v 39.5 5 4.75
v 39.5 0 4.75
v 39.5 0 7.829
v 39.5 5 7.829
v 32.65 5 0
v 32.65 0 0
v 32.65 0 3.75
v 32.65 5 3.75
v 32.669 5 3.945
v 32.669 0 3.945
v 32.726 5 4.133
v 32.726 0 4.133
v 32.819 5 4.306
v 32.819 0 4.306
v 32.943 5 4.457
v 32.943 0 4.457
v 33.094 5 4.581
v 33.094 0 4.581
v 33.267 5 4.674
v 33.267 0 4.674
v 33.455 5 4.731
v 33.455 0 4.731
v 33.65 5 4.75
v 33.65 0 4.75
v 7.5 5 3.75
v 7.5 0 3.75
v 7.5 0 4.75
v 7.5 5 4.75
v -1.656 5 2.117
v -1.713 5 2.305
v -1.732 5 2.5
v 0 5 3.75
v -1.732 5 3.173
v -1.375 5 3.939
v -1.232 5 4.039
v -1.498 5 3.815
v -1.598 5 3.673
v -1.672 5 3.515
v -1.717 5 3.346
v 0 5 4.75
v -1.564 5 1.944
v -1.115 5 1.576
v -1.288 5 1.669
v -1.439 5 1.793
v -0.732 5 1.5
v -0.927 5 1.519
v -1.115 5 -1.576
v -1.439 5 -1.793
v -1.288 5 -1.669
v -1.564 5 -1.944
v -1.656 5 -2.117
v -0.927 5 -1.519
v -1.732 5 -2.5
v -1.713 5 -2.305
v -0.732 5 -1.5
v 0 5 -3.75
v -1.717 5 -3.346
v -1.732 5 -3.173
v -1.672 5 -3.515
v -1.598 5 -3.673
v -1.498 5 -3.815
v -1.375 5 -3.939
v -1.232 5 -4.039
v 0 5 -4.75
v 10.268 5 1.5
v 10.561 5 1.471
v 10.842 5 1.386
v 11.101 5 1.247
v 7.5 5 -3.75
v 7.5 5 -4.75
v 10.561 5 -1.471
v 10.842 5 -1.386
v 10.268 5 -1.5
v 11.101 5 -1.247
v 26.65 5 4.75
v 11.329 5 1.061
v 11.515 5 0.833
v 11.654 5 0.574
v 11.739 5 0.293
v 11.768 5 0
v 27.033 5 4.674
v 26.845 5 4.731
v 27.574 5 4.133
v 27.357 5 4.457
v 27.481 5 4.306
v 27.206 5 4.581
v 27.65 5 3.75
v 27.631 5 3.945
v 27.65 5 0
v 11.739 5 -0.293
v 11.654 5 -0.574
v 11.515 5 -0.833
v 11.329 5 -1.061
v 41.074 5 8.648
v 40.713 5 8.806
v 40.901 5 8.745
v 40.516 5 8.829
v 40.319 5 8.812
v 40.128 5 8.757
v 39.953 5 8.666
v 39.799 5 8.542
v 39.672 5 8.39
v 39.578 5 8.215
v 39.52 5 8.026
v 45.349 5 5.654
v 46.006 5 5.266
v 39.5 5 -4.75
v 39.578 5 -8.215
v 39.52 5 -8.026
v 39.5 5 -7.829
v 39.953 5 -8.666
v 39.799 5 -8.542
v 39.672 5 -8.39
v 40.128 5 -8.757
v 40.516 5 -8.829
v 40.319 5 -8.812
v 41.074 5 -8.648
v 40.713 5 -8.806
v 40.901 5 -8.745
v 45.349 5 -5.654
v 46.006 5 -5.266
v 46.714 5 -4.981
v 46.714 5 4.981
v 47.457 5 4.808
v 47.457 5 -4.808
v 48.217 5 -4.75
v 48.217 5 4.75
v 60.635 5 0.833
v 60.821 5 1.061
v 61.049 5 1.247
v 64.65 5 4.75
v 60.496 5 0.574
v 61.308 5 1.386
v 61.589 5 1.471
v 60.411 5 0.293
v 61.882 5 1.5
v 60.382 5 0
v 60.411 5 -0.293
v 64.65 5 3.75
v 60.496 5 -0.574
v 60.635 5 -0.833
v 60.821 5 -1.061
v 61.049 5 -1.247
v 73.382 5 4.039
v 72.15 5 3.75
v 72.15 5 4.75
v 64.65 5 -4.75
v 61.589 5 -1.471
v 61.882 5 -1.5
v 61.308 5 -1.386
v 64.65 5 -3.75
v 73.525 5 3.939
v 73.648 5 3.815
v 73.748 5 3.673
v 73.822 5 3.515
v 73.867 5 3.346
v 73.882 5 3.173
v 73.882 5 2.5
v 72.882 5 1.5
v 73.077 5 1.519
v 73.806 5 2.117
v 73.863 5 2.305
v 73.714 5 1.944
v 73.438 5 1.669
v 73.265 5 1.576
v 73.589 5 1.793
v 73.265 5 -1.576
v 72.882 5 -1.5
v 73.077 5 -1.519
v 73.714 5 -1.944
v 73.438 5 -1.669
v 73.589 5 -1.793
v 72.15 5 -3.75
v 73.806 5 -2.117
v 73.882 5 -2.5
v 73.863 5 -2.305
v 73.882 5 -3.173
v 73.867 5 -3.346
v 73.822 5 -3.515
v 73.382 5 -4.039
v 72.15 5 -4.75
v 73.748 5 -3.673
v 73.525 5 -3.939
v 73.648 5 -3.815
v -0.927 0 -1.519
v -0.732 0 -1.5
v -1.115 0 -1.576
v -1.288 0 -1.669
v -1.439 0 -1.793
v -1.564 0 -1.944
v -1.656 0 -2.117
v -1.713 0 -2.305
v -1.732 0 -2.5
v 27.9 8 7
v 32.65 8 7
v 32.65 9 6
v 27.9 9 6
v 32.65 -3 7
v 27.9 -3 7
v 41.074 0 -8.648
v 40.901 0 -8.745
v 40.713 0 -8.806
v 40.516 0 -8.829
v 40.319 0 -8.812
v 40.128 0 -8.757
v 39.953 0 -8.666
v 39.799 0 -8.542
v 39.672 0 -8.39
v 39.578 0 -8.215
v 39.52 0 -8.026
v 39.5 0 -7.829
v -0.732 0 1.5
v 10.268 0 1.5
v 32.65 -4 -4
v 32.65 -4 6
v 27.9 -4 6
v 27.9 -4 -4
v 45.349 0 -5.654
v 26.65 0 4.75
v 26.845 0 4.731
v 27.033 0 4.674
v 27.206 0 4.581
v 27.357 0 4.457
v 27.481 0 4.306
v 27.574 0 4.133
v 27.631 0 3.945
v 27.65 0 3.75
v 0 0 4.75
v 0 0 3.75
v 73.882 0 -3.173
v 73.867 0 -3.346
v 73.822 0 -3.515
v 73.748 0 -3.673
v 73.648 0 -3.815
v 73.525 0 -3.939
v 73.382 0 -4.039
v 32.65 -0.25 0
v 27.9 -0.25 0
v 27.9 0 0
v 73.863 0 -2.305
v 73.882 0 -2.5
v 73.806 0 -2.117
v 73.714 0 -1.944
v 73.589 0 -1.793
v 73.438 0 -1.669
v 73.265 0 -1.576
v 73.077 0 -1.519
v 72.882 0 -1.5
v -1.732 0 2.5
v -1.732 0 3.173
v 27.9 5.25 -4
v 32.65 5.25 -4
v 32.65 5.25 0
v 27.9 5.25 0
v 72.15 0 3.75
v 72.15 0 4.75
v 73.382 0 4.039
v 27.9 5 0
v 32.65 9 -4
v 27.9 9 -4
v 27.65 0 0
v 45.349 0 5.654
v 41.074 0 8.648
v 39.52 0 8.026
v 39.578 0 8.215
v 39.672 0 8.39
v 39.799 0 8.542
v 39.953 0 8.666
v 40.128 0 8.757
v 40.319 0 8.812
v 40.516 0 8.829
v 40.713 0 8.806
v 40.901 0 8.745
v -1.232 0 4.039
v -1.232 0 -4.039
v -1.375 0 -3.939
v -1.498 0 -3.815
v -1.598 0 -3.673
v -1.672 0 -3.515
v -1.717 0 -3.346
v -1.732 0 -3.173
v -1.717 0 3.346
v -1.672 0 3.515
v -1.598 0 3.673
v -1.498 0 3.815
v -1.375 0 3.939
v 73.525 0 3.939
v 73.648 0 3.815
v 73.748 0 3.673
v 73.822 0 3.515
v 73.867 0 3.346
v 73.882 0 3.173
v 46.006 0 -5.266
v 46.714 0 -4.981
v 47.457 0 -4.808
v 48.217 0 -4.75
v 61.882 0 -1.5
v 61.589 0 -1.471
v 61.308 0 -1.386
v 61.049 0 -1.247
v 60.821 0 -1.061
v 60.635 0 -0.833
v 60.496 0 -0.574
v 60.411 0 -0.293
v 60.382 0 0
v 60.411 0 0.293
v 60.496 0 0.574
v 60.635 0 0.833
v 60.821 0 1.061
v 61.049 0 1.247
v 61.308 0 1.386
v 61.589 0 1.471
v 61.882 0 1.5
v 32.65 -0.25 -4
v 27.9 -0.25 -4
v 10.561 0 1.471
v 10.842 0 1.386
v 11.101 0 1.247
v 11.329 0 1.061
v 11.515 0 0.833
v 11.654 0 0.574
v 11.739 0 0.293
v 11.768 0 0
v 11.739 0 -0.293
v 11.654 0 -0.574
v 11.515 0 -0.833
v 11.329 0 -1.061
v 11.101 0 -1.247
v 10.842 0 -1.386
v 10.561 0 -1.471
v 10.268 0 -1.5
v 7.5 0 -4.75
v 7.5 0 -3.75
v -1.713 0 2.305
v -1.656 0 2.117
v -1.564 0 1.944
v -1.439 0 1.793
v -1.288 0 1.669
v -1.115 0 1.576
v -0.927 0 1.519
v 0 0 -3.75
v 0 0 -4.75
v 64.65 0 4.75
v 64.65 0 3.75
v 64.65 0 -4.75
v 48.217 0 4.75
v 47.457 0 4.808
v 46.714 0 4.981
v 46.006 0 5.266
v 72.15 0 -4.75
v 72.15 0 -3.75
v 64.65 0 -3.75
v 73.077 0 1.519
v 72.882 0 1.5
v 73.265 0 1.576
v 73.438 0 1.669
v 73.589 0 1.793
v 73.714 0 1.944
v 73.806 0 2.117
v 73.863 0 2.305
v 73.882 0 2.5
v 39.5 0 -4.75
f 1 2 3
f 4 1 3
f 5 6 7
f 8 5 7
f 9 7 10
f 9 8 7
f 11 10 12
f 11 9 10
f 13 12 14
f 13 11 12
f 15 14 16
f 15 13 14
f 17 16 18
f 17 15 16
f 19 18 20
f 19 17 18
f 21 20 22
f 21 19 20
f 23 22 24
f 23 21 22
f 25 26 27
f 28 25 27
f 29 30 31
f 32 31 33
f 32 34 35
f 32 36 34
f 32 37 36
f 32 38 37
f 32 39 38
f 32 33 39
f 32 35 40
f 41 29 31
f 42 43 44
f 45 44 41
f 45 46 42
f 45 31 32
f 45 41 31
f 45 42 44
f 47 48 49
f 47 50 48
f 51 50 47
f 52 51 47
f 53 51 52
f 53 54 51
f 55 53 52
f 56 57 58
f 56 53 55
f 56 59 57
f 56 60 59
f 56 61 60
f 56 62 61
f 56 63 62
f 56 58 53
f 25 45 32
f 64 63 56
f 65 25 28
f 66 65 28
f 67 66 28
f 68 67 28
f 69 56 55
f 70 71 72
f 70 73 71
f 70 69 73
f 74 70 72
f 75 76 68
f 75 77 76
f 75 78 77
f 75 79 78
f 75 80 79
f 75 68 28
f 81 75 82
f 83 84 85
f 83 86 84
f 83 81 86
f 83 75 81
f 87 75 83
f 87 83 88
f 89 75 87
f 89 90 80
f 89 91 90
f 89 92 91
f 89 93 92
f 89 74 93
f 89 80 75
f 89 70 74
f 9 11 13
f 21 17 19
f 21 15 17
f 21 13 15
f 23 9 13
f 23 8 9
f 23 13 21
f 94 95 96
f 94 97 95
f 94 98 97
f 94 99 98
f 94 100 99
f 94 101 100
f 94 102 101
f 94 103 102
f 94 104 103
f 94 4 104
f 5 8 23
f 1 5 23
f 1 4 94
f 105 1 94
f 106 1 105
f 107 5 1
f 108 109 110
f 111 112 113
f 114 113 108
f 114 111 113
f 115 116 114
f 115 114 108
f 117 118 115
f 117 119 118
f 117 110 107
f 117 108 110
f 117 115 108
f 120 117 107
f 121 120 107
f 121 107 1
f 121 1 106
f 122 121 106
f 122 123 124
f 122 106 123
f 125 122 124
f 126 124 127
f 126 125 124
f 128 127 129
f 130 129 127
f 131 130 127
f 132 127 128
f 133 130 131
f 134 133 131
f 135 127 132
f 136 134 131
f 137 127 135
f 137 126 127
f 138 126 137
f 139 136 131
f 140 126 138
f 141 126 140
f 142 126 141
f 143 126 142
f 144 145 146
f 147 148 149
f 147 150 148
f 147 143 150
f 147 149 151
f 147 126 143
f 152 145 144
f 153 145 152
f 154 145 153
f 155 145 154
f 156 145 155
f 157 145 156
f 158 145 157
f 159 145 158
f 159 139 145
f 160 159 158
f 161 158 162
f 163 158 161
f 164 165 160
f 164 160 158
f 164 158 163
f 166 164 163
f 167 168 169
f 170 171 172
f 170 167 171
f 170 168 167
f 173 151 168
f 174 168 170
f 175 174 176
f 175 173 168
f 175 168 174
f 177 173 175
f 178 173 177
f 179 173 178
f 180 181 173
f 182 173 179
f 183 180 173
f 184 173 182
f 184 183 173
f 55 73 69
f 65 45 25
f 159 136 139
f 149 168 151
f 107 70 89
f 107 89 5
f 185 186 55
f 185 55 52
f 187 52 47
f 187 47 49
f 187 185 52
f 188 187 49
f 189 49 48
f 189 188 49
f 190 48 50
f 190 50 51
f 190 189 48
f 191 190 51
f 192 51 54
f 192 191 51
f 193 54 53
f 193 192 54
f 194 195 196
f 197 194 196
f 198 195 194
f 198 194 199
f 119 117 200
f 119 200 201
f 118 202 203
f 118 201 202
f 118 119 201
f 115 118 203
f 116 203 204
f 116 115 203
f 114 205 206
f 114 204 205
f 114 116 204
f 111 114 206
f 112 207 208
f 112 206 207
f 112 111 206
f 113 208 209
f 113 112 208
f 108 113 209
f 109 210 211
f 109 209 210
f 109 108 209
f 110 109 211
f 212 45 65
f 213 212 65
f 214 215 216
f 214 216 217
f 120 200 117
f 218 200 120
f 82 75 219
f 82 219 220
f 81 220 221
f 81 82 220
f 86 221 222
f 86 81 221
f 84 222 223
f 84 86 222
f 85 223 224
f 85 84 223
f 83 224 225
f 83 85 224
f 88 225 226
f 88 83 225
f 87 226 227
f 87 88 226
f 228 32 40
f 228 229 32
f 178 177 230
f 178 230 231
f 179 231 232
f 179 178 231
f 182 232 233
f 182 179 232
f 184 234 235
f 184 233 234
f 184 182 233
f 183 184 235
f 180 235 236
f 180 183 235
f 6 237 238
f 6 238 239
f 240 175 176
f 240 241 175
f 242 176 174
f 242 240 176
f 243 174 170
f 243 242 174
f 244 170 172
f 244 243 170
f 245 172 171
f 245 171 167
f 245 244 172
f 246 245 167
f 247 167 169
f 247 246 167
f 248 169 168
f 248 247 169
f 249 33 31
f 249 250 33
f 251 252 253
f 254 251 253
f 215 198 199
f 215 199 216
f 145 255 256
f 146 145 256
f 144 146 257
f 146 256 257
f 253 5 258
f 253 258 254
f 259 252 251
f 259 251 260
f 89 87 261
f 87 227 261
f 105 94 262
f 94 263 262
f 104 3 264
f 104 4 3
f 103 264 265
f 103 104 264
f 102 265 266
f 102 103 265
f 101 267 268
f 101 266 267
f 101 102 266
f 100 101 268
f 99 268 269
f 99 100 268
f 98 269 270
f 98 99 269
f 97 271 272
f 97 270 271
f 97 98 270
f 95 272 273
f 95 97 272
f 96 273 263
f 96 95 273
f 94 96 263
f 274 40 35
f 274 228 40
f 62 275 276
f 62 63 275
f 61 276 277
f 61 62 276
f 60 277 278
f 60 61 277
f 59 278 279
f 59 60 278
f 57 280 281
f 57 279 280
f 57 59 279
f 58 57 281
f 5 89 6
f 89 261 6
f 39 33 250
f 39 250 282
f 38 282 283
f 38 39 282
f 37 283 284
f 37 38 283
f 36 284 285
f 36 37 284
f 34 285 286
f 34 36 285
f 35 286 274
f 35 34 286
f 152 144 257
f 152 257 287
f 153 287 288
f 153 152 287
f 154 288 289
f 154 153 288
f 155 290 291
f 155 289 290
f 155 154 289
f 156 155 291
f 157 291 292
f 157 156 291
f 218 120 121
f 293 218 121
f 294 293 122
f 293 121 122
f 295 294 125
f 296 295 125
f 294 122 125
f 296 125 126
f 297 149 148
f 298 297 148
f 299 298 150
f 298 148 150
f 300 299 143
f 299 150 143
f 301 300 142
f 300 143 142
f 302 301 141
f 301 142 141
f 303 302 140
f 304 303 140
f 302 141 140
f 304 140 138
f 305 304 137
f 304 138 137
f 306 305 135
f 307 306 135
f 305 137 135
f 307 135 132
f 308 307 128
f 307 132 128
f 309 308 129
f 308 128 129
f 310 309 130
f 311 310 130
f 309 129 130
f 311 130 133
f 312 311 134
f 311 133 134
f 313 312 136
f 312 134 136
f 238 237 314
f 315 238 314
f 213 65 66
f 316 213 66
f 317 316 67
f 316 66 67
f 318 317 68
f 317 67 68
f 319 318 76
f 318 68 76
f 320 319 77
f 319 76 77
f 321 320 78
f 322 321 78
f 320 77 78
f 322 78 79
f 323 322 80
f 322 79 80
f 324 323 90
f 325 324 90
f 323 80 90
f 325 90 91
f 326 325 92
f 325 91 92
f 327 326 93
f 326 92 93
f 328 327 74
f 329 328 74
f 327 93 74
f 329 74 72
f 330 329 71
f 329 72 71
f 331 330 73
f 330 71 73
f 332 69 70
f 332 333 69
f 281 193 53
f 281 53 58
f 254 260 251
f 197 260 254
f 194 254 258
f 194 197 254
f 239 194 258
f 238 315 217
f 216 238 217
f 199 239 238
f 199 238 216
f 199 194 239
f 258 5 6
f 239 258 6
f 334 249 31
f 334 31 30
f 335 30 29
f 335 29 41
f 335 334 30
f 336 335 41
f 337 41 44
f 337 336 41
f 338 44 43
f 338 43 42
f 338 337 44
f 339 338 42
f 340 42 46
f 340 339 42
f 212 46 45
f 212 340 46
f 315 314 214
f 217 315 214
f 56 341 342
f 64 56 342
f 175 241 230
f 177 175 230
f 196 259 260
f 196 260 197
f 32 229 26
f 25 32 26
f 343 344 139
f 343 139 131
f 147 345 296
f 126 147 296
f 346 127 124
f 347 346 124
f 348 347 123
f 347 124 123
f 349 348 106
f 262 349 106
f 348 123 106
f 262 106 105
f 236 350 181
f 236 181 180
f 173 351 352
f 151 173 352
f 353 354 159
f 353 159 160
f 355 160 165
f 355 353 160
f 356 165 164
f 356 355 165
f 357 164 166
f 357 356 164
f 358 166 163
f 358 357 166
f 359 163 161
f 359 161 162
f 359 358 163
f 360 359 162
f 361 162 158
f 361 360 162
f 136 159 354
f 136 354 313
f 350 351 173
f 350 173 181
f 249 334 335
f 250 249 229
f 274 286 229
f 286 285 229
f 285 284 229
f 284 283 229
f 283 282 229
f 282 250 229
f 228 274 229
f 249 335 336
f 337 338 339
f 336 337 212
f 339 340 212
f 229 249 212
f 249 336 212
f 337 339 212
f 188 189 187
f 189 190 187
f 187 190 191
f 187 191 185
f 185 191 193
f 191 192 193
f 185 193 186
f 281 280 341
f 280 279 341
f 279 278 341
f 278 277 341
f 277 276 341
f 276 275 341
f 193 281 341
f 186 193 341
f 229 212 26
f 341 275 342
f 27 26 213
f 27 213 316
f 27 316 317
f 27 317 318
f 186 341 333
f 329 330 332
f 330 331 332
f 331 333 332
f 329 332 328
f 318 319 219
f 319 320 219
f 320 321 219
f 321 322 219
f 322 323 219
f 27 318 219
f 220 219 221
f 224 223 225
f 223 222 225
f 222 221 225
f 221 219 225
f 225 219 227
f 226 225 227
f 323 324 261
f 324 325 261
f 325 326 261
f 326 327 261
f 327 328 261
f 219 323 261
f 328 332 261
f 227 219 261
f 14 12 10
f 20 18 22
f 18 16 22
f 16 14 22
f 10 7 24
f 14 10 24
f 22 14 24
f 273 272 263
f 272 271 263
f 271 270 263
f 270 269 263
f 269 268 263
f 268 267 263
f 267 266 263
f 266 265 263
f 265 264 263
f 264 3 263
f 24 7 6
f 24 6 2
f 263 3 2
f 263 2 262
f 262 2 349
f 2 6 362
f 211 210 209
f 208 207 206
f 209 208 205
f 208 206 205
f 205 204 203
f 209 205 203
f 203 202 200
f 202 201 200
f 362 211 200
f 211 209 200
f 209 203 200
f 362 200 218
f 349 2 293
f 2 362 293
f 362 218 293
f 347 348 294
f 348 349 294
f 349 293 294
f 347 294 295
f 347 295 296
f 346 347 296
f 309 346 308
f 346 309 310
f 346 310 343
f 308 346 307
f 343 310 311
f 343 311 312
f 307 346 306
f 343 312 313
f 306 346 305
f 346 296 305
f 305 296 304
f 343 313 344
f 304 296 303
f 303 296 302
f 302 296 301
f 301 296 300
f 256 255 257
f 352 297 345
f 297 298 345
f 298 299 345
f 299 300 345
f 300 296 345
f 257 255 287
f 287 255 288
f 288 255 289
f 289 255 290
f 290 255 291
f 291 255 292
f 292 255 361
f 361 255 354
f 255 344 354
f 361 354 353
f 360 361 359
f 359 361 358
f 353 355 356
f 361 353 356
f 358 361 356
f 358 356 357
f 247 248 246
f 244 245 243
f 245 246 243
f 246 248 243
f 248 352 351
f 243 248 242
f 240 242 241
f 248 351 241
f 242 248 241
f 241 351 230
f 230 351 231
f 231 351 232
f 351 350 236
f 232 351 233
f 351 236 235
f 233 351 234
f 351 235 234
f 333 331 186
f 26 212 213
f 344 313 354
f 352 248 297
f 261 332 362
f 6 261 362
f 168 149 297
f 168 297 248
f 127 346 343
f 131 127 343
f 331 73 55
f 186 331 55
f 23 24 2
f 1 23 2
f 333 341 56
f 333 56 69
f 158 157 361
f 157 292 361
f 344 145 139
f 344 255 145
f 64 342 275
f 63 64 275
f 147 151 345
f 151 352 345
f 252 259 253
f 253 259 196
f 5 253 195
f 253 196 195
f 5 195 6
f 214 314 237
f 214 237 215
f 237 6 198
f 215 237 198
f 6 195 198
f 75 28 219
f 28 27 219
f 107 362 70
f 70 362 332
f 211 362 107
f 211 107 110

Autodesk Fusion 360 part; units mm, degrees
sketch "Sketch1" plane through (0, 0, 0) normal (0, 1, 0) x (1, 0, 0)
  line L0 (0, 0) -> (0, -3.75) construction
  line L1 (0, -3.75) -> (7.5, -3.75)
  line L2 (0, -3.75) -> (0, -4.75)
  line L3 (0, -4.75) -> (-1.7321, -3.75)
  line L4 (0, -4.75) -> (1.5486, -4.75) construction
  line L5 (-1.7321, -3.75) -> (-1.7321, 0)
  line L6 (7.5, -3.75) -> (7.5, -4.75)
  line L7 (7.5, -4.75) -> (64.65, -4.75)
  line L8 (-1.7321, 0) -> (36.075, 0) construction
  line L9 (36.075, 0) -> (36.075, -4.75) construction
  line L10 (73.8821, -3.75) -> (73.8821, 0)
  line L11 (72.15, -4.75) -> (73.8821, -3.75)
  line L12 (72.15, -3.75) -> (64.65, -3.75)
  line L13 (72.15, -3.75) -> (72.15, -4.75)
  line L14 (64.65, -3.75) -> (64.65, -4.75)
  line L15 (64.65, -4.75) -> (7.5, -4.75)
  line L16 (73.8821, 3.75) -> (73.8821, 0)
  line L17 (72.15, 4.75) -> (73.8821, 3.75)
  line L18 (72.15, 3.75) -> (64.65, 3.75)
  line L19 (72.15, 3.75) -> (72.15, 4.75)
  line L20 (64.65, 3.75) -> (64.65, 4.75)
  line L21 (64.65, 4.75) -> (7.5, 4.75)
  line L22 (7.5, 3.75) -> (7.5, 4.75)
  line L23 (0, 3.75) -> (7.5, 3.75)
  line L24 (0, 3.75) -> (0, 4.75)
  line L25 (0, 4.75) -> (-1.7321, 3.75)
  line L26 (-1.7321, 3.75) -> (-1.7321, 0)
  line L27 (-1.7321, 0) -> (73.8821, 0)
  point P0 (36.075, -4.75)
  dimension "d1" = 3.75
  dimension "d2" = 7.5
  dimension "d4" = 150
  dimension "d5" = 57.15
  dimension "d8" = 4.75
extrude "Extrude1" add sketch "Sketch1" along normal blind 5 makes body 1
sketch "Sketch2" plane through (0, 5, 0) normal (0, 1, 0) x (-1, 0, 0)
  line L0 (0, -3.75) -> (0, -4.75)
  line L1 (0, -4.75) -> (1.7321, -3.75)
  line L2 (1.7321, -3.75) -> (1.7321, 3.75)
  line L3 (1.7321, 3.75) -> (0, 4.75)
  line L4 (0, 4.75) -> (0, 3.75)
  line L5 (0, 3.75) -> (-7.5, 3.75)
  line L6 (-7.5, 3.75) -> (-7.5, 4.75)
  line L7 (-7.5, 4.75) -> (-64.65, 4.75)
  line L8 (-64.65, 4.75) -> (-64.65, 3.75)
  line L9 (-64.65, 3.75) -> (-72.15, 3.75)
  line L10 (-72.15, 3.75) -> (-72.15, 4.75)
  line L11 (-72.15, 4.75) -> (-73.8821, 3.75)
  line L12 (-73.8821, 3.75) -> (-73.8821, -3.75)
  line L13 (-73.8821, -3.75) -> (-72.15, -4.75)
  line L14 (-72.15, -4.75) -> (-72.15, -3.75)
  line L15 (-72.15, -3.75) -> (-64.65, -3.75)
  line L16 (-64.65, -3.75) -> (-64.65, -4.75)
  line L17 (-64.65, -4.75) -> (-7.5, -4.75)
  line L18 (-7.5, -4.75) -> (-7.5, -3.75)
  line L19 (-7.5, -3.75) -> (0, -3.75)
  line L20 (-73.8821, 0) -> (1.7321, 0) construction
  line L21 (-36.075, 4.75) -> (-36.075, -4.75) construction
  line L22 (1.7321, 1.5) -> (-10.2679, 1.5)
  arc A0 (-10.2679, 1.5) -> (-10.2679, -1.5) centre (-10.2679, 0) ccw
  line L23 (-10.2679, -1.5) -> (1.7321, -1.5)
  arc A1 (1.7321, -1.5) -> (1.7321, 1.5) centre (1.7321, 0) ccw
  line L24 (1.7321, 0) -> (-10.2679, 0) construction
  line L25 (-61.8821, -1.5) -> (-73.8821, -1.5)
  arc A2 (-61.8821, -1.5) -> (-61.8821, 1.5) centre (-61.8821, 0) ccw
  line L26 (-73.8821, 1.5) -> (-61.8821, 1.5)
  arc A3 (-73.8821, 1.5) -> (-73.8821, -1.5) centre (-73.8821, 0) ccw
  dimension "d9" = 1.5
  dimension "d10" = 12
extrude "Extrude2" cut sketch "Sketch2" against normal through all contours L2 L22 A0 L23 | L12 L25 A2 L26 bodies 1
sketch "Sketch3" plane through (0, 0, 0) normal (0, -1, 0) x (1, 0, 0)
  line L0 (61.8821, 1.5) -> (73.8821, 1.5)
  line L1 (73.8821, 1.5) -> (73.8821, 3.75)
  line L2 (73.8821, 3.75) -> (72.15, 4.75)
  line L3 (72.15, 4.75) -> (72.15, 3.75)
  line L4 (72.15, 3.75) -> (64.65, 3.75)
  line L5 (64.65, 3.75) -> (64.65, 4.75)
  line L6 (64.65, 4.75) -> (7.5, 4.75)
  line L7 (7.5, 4.75) -> (7.5, 3.75)
  line L8 (7.5, 3.75) -> (0, 3.75)
  line L9 (0, 3.75) -> (0, 4.75)
  line L10 (0, 4.75) -> (-1.7321, 3.75)
  line L11 (-1.7321, 3.75) -> (-1.7321, 1.5)
  line L12 (-1.7321, 1.5) -> (10.2679, 1.5)
  arc A0 (10.2679, -1.5) -> (10.2679, 1.5) centre (10.2679, 0) ccw
  line L13 (10.2679, -1.5) -> (-1.7321, -1.5)
  line L14 (-1.7321, -1.5) -> (-1.7321, -3.75)
  line L15 (-1.7321, -3.75) -> (0, -4.75)
  line L16 (0, -4.75) -> (0, -3.75)
  line L17 (0, -3.75) -> (7.5, -3.75)
  line L18 (7.5, -3.75) -> (7.5, -4.75)
  line L19 (7.5, -4.75) -> (64.65, -4.75)
  line L20 (64.65, -4.75) -> (64.65, -3.75)
  line L21 (64.65, -3.75) -> (72.15, -3.75)
  line L22 (72.15, -3.75) -> (72.15, -4.75)
  line L23 (72.15, -4.75) -> (73.8821, -3.75)
  line L24 (73.8821, -3.75) -> (73.8821, -1.5)
  line L25 (73.8821, -1.5) -> (61.8821, -1.5)
  arc A1 (61.8821, 1.5) -> (61.8821, -1.5) centre (61.8821, 0) ccw
  line L26 (36.075, 4.75) -> (36.075, -4.75) construction
  line L27 (32.65, 4.75) -> (32.65, -4.75) construction
  line L28 (39.5, 4.75) -> (39.5, -4.75) construction
  line L29 (39.5, 4.75) -> (39.5, 9.75)
  line L30 (39.5, 9.75) -> (46.6407, 4.75)
  line L31 (32.65, 0) -> (39.5, 0) construction
  line L32 (39.5, -4.75) -> (39.5, -9.75)
  line L33 (39.5, -9.75) -> (46.6407, -4.75)
  line L34 (32.65, 4.75) -> (27.65, 4.75)
  line L35 (27.65, 4.75) -> (27.65, 0)
  line L36 (27.65, 0) -> (32.65, 0)
  line L37 (32.65, 0) -> (32.65, 4.75)
  dimension "d13" = 6.85
  dimension "d14" = 35
  dimension "d15" = 5
  dimension "d16" = 5
  dimension "d17" = 4.75
extrude "Extrude3" add sketch "Sketch3" against normal blind 5 contours L6 L29 L30 | L19 L32 L33 bodies 1
extrude "Extrude4" cut sketch "Sketch3" against normal blind 5 contours L6 L34 L35 L36 L37 bodies 1
fillet "Fillet1" radius 1 2 edges at (39.5, 2.5, 9.75) (39.5, 2.5, -9.75) on bodies 1
fillet "Fillet1" radius 5 2 edges at (46.6407, 2.5, 4.75) (46.6407, 2.5, -4.75) on bodies 1
fillet "Fillet1" radius 1 8 edges at (73.8821, 2.5, 3.75) (73.8821, 2.5, 1.5) (73.8821, 2.5, -1.5) (73.8821, 2.5, -3.75) (-1.7321, 2.5, 3.75) (-1.7321, 2.5, 1.5) (-1.7321, 2.5, -1.5) (-1.7321, 2.5, -3.75) on bodies 1
fillet "Fillet1" radius 1 2 edges at (32.65, 2.5, 4.75) (27.65, 2.5, 4.75) on bodies 1
sketch "Sketch1 (2)" plane through (32.65, 0, 0) normal (-1, 0, 0) x (0, -1, 0) in component "Component"
  line L0 (-5, 3.75) -> (-5, 0)
  line L1 (-5, 0) -> (0, 0)
  line L2 (0, 0) -> (0, 3.75)
  line L3 (0, 0) -> (-5, 0)
  line L4 (-5, 0) -> (0, 0)
  line L5 (0.25, 0) -> (-5.25, 0)
  line L6 (-8, 7) -> (3, 7)
  line L7 (4, 6) -> (4, -4)
  line L8 (-9, -4) -> (-9, 6)
  line L9 (-5.25, -4) -> (-5.25, 0)
  line L10 (0.25, 0) -> (0.25, -4)
  line L11 (0.25, -4) -> (4, -4)
  line L12 (-5.25, -4) -> (-9, -4)
  line L13 (3, 7) -> (4, 6)
  line L14 (-8, 7) -> (-9, 6)
  point P0 (-9, 7)
  point P1 (4, 7)
  dimension "d38" = 1
  dimension "d39" = 1
  dimension "d40" = 1
  dimension "d41" = 1
extrude "Extrude1'" add sketch "Sketch1 (2)" along normal blind 4.75 separate body makes body 2 in component "Component"
component "Component" placed x (1, 0, 0) y (0, 1, 0) z (0, 0, 1) at (0, 0, 0)
equation "d13 = 6.35 mm + 0.5 mm"
equation "d39 = d38"
equation "d41 = d40"
